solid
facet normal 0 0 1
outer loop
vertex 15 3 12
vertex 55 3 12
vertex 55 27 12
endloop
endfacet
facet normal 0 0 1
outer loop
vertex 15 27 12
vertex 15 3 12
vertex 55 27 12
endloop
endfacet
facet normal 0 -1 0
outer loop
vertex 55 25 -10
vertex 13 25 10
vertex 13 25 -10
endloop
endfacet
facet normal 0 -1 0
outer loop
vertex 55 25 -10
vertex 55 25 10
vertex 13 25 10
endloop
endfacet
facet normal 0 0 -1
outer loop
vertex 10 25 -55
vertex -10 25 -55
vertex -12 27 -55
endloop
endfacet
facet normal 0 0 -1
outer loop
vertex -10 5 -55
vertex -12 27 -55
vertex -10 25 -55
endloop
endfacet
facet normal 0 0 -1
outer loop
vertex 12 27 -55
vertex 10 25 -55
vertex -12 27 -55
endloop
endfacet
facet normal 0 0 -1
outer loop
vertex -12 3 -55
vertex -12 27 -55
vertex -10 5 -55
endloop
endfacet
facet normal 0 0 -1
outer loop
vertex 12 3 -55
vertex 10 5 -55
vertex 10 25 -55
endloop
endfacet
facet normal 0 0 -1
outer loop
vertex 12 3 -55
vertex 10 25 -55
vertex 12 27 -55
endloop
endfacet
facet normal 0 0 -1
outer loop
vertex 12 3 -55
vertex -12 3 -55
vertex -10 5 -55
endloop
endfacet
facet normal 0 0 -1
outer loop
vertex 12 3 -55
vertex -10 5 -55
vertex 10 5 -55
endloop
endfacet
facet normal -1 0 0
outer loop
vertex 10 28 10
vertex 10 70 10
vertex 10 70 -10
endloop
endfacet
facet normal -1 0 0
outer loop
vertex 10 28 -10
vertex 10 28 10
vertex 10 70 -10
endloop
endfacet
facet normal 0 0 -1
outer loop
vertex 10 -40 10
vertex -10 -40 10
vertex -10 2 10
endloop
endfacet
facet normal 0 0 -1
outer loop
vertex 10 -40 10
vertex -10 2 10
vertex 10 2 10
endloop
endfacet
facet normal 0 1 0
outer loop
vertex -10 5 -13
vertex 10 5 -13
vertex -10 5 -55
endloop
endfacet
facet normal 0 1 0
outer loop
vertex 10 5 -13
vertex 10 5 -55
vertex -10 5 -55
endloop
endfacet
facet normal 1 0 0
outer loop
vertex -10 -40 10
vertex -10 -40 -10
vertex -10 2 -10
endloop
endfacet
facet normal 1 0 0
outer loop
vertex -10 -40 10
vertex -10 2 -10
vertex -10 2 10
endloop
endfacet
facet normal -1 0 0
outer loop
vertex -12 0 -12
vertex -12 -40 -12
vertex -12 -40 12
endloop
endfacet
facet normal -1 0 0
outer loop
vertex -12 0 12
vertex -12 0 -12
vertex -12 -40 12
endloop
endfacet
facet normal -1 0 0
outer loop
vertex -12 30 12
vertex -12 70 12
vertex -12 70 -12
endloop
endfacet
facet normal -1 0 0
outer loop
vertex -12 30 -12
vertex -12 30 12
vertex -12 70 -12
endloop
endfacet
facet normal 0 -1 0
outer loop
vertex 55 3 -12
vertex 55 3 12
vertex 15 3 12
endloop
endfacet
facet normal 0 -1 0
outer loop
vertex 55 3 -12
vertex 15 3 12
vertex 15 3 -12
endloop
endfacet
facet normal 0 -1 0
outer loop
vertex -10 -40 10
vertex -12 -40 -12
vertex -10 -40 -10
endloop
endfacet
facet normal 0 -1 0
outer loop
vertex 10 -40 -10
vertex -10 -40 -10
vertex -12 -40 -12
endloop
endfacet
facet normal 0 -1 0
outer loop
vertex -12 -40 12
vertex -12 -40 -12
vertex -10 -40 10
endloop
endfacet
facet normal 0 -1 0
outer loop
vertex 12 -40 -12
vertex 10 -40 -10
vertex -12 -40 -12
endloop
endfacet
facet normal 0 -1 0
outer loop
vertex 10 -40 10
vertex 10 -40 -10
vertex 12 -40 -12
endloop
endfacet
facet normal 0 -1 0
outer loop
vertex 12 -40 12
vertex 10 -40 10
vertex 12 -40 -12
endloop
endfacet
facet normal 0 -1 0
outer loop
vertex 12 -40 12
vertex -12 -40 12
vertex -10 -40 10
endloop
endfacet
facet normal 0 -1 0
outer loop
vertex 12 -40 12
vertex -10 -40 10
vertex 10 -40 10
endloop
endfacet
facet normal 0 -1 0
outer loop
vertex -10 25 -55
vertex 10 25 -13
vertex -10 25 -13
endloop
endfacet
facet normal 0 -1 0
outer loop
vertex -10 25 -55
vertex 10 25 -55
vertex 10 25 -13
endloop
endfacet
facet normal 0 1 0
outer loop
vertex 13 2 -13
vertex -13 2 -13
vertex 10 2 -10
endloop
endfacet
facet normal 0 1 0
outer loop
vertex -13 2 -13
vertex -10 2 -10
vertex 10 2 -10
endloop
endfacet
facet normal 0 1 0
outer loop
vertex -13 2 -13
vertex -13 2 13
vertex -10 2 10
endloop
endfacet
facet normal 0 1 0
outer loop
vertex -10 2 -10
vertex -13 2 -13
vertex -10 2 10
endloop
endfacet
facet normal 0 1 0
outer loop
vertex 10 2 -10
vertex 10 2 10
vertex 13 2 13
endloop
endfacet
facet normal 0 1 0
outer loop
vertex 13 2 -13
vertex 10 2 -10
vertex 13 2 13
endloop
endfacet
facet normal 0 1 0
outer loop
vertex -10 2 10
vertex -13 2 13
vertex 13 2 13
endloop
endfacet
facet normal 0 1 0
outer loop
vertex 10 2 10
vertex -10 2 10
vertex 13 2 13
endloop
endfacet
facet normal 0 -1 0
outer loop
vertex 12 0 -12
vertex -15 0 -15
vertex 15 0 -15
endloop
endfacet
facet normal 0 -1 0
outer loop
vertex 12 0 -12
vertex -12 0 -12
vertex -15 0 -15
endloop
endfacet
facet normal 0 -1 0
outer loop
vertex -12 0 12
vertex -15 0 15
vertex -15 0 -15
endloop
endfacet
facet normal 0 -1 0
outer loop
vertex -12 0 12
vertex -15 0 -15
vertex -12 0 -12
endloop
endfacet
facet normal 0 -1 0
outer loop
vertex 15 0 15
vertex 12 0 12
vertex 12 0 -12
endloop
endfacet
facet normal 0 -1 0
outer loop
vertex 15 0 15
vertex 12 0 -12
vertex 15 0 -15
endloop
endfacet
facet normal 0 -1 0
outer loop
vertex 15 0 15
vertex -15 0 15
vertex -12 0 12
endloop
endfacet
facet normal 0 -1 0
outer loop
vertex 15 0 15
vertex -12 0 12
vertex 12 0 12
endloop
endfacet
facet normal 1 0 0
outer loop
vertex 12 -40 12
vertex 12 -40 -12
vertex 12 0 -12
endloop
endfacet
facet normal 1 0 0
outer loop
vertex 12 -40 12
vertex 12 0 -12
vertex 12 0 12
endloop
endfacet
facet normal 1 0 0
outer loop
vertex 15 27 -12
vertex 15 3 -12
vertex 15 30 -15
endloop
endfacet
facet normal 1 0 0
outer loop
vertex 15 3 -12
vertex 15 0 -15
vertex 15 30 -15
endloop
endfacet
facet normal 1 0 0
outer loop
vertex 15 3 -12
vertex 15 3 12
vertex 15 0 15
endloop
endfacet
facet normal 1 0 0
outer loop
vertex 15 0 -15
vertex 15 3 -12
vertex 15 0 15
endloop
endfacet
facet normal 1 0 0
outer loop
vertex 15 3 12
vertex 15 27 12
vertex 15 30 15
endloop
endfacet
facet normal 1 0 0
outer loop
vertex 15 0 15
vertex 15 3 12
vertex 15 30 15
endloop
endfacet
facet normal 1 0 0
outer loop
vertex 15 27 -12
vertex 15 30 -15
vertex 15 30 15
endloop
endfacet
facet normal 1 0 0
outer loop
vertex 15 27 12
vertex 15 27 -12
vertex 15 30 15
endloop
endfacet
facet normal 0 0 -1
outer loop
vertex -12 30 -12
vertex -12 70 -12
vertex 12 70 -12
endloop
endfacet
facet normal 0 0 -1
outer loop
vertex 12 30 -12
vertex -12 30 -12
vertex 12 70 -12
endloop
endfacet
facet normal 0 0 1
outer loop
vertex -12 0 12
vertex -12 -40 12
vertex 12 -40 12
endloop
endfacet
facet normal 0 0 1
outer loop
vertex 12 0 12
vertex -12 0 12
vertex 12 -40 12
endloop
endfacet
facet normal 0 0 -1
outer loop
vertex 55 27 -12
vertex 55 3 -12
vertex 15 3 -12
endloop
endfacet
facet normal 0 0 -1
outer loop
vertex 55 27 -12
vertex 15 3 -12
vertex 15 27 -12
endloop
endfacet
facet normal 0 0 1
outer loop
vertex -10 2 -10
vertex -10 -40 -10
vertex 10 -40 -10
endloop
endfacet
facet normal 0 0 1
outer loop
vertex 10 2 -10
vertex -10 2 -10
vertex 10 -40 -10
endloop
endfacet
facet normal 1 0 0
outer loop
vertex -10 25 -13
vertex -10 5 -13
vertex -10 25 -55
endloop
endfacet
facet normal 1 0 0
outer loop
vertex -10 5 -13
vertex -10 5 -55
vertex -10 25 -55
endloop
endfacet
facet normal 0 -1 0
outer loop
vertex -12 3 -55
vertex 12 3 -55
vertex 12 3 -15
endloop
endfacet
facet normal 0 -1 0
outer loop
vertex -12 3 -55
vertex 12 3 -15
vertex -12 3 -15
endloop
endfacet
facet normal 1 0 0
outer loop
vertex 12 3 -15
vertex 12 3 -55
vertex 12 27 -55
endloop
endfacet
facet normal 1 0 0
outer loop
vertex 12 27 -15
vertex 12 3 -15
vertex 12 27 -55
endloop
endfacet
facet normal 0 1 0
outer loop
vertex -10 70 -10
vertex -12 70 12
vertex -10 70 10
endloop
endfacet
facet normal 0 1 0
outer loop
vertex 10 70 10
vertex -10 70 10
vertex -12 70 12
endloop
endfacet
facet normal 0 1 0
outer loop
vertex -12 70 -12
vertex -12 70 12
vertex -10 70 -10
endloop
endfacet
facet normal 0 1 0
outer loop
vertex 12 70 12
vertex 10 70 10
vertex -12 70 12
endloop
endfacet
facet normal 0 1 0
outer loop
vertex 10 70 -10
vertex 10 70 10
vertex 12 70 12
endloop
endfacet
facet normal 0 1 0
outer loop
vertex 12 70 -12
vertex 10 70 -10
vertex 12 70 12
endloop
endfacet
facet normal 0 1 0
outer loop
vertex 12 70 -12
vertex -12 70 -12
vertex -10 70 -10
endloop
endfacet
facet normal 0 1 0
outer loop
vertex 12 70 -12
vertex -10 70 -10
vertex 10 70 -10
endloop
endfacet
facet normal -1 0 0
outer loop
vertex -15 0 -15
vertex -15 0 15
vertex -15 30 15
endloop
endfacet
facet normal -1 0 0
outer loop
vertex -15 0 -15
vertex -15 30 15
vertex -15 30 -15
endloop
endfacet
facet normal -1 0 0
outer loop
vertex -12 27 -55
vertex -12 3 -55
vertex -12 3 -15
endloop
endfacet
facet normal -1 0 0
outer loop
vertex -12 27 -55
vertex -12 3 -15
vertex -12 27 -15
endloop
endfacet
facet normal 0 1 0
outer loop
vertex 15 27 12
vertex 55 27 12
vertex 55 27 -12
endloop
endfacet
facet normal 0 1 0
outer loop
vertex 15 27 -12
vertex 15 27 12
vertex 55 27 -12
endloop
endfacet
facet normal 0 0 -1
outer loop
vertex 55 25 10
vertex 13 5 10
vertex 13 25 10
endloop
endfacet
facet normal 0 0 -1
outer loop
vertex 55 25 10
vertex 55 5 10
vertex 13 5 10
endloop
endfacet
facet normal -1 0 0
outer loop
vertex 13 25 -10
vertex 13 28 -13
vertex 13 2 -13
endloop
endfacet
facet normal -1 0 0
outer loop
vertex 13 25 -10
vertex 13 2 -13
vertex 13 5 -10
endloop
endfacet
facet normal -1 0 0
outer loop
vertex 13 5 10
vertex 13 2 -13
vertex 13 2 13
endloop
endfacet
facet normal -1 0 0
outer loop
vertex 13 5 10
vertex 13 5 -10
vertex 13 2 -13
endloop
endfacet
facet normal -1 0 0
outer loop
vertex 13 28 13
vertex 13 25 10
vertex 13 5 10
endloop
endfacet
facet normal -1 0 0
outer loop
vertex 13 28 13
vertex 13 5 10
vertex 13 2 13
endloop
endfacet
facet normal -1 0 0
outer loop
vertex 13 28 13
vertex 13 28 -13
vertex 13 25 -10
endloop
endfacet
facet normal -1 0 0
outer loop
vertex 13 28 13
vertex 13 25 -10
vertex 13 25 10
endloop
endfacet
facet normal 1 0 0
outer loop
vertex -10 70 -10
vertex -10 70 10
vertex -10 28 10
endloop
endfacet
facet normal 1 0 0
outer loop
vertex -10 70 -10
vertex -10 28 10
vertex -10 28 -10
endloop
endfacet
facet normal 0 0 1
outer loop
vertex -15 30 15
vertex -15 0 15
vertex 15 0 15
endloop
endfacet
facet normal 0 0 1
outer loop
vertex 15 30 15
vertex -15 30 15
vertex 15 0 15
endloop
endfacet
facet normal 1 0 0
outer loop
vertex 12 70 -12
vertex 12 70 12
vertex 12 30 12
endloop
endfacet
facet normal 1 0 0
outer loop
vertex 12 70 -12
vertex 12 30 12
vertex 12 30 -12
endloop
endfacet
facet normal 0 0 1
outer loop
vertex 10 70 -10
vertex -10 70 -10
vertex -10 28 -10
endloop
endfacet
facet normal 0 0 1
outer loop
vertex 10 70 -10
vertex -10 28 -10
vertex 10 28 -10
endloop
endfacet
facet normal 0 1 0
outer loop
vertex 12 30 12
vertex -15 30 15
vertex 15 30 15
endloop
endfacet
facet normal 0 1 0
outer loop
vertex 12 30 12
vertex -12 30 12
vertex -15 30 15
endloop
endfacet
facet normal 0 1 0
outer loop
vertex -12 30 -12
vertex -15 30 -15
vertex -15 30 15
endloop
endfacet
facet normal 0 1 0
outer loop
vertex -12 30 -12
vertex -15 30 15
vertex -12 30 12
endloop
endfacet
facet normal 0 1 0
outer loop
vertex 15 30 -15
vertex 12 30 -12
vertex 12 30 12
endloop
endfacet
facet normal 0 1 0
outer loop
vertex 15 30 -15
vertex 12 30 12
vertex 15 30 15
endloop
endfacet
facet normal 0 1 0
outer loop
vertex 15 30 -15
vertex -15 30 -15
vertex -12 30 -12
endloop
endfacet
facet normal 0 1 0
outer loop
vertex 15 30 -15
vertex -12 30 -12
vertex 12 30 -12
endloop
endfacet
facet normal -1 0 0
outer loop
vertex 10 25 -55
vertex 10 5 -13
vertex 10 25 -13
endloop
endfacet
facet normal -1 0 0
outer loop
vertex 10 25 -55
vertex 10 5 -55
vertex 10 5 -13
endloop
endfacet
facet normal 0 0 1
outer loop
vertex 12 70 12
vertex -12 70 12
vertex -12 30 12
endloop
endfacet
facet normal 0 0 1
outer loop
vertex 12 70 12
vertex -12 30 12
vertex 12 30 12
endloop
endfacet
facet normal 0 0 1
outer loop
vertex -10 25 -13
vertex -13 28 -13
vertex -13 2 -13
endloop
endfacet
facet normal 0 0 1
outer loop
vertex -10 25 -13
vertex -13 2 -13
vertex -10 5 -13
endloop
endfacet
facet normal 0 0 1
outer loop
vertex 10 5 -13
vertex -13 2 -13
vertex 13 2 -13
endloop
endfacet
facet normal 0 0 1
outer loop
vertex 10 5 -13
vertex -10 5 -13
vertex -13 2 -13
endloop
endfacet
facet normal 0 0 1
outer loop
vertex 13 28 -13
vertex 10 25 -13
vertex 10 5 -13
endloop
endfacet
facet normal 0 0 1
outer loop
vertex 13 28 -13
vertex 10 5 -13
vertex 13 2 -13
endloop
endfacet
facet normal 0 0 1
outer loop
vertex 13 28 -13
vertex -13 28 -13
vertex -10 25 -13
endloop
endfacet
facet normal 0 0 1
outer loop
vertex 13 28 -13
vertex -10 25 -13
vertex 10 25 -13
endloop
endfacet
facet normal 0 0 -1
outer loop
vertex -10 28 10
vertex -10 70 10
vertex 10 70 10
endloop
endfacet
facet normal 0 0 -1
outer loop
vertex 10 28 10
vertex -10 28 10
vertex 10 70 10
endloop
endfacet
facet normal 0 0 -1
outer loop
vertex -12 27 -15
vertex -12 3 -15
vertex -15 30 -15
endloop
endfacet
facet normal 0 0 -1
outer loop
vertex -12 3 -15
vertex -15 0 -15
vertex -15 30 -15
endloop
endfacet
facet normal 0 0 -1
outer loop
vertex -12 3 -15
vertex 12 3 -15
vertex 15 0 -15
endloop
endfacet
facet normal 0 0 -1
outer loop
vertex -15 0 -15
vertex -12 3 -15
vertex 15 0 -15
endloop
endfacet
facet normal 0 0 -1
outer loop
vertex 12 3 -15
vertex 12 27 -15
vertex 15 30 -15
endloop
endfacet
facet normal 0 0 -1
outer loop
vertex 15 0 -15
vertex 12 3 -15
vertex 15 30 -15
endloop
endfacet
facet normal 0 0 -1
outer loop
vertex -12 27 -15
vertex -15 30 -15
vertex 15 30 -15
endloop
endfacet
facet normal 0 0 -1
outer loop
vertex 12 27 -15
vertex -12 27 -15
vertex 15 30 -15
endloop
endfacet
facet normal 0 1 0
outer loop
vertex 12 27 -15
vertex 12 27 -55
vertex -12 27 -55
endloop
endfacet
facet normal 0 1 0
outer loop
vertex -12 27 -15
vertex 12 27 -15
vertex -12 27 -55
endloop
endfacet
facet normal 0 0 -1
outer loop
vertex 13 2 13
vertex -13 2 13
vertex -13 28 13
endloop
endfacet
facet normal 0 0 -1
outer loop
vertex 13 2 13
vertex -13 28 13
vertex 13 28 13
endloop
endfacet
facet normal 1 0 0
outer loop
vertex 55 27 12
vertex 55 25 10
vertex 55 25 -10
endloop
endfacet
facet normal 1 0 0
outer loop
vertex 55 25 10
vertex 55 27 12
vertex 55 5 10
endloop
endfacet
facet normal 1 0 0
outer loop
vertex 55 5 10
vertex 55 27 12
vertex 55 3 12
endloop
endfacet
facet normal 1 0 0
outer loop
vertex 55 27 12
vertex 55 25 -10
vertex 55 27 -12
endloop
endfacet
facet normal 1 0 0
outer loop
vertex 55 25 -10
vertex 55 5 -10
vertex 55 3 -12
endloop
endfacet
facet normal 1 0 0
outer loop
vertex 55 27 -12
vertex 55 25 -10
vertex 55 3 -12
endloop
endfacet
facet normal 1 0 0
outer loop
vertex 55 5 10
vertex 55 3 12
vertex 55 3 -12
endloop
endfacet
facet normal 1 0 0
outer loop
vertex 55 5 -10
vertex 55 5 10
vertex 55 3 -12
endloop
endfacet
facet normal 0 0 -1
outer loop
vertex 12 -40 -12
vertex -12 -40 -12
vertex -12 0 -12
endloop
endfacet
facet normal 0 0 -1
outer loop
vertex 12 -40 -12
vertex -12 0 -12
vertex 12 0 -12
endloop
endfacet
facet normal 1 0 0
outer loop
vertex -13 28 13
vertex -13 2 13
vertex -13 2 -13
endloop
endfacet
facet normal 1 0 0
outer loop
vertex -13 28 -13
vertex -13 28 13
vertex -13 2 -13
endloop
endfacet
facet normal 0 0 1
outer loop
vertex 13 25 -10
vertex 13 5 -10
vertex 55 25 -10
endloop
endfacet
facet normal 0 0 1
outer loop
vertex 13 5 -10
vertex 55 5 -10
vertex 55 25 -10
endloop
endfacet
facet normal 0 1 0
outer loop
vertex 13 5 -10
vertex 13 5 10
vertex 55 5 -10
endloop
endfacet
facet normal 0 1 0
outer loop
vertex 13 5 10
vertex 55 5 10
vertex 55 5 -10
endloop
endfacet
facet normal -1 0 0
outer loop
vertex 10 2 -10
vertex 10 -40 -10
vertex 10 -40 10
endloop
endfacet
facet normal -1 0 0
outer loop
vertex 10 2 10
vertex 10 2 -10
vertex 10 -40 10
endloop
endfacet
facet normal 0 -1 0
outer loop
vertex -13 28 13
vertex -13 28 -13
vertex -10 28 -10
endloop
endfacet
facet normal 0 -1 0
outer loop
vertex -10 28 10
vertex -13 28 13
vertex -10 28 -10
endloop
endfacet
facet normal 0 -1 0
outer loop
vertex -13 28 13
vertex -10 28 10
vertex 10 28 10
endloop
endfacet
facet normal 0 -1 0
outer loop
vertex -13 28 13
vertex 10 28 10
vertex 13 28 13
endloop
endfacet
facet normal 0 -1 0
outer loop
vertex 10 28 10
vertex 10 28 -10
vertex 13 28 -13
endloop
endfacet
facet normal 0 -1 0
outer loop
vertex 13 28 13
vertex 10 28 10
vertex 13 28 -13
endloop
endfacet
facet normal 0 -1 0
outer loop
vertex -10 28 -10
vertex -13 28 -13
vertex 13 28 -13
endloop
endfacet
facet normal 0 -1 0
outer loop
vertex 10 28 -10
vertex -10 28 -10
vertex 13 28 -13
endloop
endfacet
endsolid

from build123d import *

# Parameters (mm, degrees)
CROQUIS1_W     = 30
CROQUIS1_H     = 40
CROQUIS1_H_2   = 30
CROQUIS1_W_2   = 40
EXTRUIR1_DEPTH = 30
CROQUIS5_W     = 30
CROQUIS5_H     = 30
EXTRUIR4_DEPTH = 40
CROQUIS8_W     = 30
CROQUIS8_H     = 30
EXTRUIR6_DEPTH = 40
CROQUIS9_W     = 30
CROQUIS9_H     = 30
CROQUIS9_W_2   = 24
CROQUIS9_H_2   = 24
EXTRUIR7_DEPTH = 40
CROQUIS2_W     = 30
CROQUIS2_H     = 30
CROQUIS2_W_2   = 24
CROQUIS2_H_2   = 24
EXTRUIR2_DEPTH = 40
CROQUIS3_W     = 30
CROQUIS3_H     = 30
CROQUIS3_W_2   = 24
CROQUIS3_H_2   = 24
EXTRUIR3_DEPTH = 40
CROQUIS7_W     = 30
CROQUIS7_H     = 30
CROQUIS7_W_2   = 24
CROQUIS7_H_2   = 24
EXTRUIR5_DEPTH = 40
VACIADO1_T     = -2


with BuildPart() as part:
    # Croquis1 → Extruir1 (new body)
    with BuildSketch(Plane(origin=(0, 0, 0), x_dir=(1, 0, 0), z_dir=(0, 1, 0))):
        with Locations((0, 35)):
            Rectangle(CROQUIS1_W, CROQUIS1_H)
        Rectangle(CROQUIS1_W, CROQUIS1_H_2)
        with Locations((35, 0)):
            Rectangle(CROQUIS1_W_2, CROQUIS1_H_2)
    extrude(amount=EXTRUIR1_DEPTH)

    # Croquis5 → Extruir4 (add)
    with BuildSketch(Plane.XZ):
        Rectangle(CROQUIS5_W, CROQUIS5_H)
    extrude(amount=EXTRUIR4_DEPTH)

    # Croquis8 → Extruir6 (add)
    with BuildSketch(Plane(origin=(0, 30, 0), x_dir=(1, 0, 0), z_dir=(0, 1, 0))):
        Rectangle(CROQUIS8_W, CROQUIS8_H)
    extrude(amount=EXTRUIR6_DEPTH)

    # Croquis9 → Extruir7 (cut)
    with BuildSketch(Plane(origin=(0, 70, 0), x_dir=(1, 0, 0), z_dir=(0, 1, 0))):
        Rectangle(CROQUIS9_W, CROQUIS9_H)
        Rectangle(CROQUIS9_W_2, CROQUIS9_H_2, mode=Mode.SUBTRACT)
    extrude(amount=-EXTRUIR7_DEPTH, mode=Mode.SUBTRACT)

    # Croquis2 → Extruir2 (cut)
    with BuildSketch(Plane(origin=(55, 0, 0), x_dir=(0, 0, -1), z_dir=(1, 0, 0))):
        with Locations((0, 15)):
            Rectangle(CROQUIS2_W, CROQUIS2_H)
        with Locations((0, 15)):
            Rectangle(CROQUIS2_W_2, CROQUIS2_H_2, mode=Mode.SUBTRACT)
    extrude(amount=-EXTRUIR2_DEPTH, mode=Mode.SUBTRACT)

    # Croquis3 → Extruir3 (cut)
    with BuildSketch(Plane(origin=(0, 0, -55), x_dir=(-1, 0, 0), z_dir=(0, 0, -1))):
        with Locations((0, 15)):
            Rectangle(CROQUIS3_W, CROQUIS3_H)
        with Locations((0, 15)):
            Rectangle(CROQUIS3_W_2, CROQUIS3_H_2, mode=Mode.SUBTRACT)
    extrude(amount=-EXTRUIR3_DEPTH, mode=Mode.SUBTRACT)

    # Croquis7 → Extruir5 (cut)
    with BuildSketch(Plane.XZ.offset(40)):
        Rectangle(CROQUIS7_W, CROQUIS7_H)
        Rectangle(CROQUIS7_W_2, CROQUIS7_H_2, mode=Mode.SUBTRACT)
    extrude(amount=-EXTRUIR5_DEPTH, mode=Mode.SUBTRACT)

    # Vaciado1
    vaciado1_openings = [part.faces().sort_by_distance(p)[0] for p in [
        (0, 15, -55),
        (0, -40, 0),
        (0, 70, 0),
        (55, 15, 0),
    ]]
    offset(amount=VACIADO1_T, openings=vaciado1_openings, kind=Kind.INTERSECTION)


solid = part.part
